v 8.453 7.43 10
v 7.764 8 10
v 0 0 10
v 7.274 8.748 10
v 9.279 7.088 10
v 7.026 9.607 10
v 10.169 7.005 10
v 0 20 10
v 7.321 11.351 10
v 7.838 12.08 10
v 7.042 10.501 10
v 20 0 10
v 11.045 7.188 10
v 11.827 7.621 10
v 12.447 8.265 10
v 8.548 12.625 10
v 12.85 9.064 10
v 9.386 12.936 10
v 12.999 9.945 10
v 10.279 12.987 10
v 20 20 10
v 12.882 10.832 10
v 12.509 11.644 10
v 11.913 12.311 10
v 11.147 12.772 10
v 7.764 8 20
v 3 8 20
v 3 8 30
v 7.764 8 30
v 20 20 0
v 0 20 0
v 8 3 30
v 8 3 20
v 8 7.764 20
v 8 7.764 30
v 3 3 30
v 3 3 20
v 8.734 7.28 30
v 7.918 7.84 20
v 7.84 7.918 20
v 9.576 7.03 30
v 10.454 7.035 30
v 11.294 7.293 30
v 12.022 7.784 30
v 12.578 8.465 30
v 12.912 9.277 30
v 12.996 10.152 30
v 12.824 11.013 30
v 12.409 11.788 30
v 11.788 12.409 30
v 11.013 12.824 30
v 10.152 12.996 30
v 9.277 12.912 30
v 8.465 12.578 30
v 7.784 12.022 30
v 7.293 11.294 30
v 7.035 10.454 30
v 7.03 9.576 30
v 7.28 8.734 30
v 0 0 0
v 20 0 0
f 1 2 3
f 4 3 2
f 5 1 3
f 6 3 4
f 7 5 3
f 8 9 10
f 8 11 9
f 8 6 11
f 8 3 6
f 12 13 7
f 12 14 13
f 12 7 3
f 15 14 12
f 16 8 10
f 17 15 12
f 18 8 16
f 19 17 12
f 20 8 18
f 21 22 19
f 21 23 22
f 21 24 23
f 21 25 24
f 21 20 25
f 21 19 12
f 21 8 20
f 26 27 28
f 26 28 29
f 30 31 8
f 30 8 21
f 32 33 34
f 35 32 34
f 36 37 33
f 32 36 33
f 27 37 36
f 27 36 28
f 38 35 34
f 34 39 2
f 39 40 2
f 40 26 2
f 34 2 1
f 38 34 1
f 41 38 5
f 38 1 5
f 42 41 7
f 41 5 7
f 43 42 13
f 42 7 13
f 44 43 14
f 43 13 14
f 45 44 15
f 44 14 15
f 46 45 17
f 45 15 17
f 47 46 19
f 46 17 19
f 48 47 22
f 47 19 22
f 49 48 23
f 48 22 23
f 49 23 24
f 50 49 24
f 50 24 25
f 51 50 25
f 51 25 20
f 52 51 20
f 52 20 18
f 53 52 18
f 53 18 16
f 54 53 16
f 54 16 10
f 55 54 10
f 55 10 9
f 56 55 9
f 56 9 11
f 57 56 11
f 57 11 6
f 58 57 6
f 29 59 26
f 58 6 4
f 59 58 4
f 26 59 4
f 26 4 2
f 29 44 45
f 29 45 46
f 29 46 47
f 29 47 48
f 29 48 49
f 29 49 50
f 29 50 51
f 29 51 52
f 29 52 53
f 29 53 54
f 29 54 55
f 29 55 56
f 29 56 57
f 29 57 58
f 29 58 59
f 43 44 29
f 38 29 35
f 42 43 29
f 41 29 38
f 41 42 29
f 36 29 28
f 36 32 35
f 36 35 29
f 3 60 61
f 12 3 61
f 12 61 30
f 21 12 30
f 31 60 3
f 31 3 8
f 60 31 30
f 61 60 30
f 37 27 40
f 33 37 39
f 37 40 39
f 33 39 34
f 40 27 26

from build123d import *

# Parameters (mm, degrees)
SKETCH_1_W           = 20
SKETCH_1_H           = 20
BASEBOX_DEPTH        = 10
SKETCH_2_W           = 5
SKETCH_2_H           = 5
TARGETBOX_DEPTH      = 10
SKETCH_3_R           = 3
UPTOVERTEXBOSS_DEPTH = 20


with BuildPart() as part:
    # 草图1 → BaseBox (new body)
    with BuildSketch(Plane.XY):
        with Locations((10, 10)):
            Rectangle(SKETCH_1_W, SKETCH_1_H)
    extrude(amount=BASEBOX_DEPTH)



with BuildPart() as body_2:
    # 草图2 → TargetBox (new body)
    with BuildSketch(Plane.XY.offset(20)):
        with Locations((5.5, 5.5)):
            Rectangle(SKETCH_2_W, SKETCH_2_H)
    extrude(amount=TARGETBOX_DEPTH)


with BuildPart() as part_1:
    add(part.part)

    add(body_2.part)  # UpToVertexBoss merges body 2
    # 草图3 → UpToVertexBoss (add)
    with BuildSketch(Plane.XY.offset(10)):
        with Locations(Location((10, 10, 0), (0, 0, 221.810314896))):
            Circle(SKETCH_3_R)
    extrude(amount=UPTOVERTEXBOSS_DEPTH)


solid = part_1.part
